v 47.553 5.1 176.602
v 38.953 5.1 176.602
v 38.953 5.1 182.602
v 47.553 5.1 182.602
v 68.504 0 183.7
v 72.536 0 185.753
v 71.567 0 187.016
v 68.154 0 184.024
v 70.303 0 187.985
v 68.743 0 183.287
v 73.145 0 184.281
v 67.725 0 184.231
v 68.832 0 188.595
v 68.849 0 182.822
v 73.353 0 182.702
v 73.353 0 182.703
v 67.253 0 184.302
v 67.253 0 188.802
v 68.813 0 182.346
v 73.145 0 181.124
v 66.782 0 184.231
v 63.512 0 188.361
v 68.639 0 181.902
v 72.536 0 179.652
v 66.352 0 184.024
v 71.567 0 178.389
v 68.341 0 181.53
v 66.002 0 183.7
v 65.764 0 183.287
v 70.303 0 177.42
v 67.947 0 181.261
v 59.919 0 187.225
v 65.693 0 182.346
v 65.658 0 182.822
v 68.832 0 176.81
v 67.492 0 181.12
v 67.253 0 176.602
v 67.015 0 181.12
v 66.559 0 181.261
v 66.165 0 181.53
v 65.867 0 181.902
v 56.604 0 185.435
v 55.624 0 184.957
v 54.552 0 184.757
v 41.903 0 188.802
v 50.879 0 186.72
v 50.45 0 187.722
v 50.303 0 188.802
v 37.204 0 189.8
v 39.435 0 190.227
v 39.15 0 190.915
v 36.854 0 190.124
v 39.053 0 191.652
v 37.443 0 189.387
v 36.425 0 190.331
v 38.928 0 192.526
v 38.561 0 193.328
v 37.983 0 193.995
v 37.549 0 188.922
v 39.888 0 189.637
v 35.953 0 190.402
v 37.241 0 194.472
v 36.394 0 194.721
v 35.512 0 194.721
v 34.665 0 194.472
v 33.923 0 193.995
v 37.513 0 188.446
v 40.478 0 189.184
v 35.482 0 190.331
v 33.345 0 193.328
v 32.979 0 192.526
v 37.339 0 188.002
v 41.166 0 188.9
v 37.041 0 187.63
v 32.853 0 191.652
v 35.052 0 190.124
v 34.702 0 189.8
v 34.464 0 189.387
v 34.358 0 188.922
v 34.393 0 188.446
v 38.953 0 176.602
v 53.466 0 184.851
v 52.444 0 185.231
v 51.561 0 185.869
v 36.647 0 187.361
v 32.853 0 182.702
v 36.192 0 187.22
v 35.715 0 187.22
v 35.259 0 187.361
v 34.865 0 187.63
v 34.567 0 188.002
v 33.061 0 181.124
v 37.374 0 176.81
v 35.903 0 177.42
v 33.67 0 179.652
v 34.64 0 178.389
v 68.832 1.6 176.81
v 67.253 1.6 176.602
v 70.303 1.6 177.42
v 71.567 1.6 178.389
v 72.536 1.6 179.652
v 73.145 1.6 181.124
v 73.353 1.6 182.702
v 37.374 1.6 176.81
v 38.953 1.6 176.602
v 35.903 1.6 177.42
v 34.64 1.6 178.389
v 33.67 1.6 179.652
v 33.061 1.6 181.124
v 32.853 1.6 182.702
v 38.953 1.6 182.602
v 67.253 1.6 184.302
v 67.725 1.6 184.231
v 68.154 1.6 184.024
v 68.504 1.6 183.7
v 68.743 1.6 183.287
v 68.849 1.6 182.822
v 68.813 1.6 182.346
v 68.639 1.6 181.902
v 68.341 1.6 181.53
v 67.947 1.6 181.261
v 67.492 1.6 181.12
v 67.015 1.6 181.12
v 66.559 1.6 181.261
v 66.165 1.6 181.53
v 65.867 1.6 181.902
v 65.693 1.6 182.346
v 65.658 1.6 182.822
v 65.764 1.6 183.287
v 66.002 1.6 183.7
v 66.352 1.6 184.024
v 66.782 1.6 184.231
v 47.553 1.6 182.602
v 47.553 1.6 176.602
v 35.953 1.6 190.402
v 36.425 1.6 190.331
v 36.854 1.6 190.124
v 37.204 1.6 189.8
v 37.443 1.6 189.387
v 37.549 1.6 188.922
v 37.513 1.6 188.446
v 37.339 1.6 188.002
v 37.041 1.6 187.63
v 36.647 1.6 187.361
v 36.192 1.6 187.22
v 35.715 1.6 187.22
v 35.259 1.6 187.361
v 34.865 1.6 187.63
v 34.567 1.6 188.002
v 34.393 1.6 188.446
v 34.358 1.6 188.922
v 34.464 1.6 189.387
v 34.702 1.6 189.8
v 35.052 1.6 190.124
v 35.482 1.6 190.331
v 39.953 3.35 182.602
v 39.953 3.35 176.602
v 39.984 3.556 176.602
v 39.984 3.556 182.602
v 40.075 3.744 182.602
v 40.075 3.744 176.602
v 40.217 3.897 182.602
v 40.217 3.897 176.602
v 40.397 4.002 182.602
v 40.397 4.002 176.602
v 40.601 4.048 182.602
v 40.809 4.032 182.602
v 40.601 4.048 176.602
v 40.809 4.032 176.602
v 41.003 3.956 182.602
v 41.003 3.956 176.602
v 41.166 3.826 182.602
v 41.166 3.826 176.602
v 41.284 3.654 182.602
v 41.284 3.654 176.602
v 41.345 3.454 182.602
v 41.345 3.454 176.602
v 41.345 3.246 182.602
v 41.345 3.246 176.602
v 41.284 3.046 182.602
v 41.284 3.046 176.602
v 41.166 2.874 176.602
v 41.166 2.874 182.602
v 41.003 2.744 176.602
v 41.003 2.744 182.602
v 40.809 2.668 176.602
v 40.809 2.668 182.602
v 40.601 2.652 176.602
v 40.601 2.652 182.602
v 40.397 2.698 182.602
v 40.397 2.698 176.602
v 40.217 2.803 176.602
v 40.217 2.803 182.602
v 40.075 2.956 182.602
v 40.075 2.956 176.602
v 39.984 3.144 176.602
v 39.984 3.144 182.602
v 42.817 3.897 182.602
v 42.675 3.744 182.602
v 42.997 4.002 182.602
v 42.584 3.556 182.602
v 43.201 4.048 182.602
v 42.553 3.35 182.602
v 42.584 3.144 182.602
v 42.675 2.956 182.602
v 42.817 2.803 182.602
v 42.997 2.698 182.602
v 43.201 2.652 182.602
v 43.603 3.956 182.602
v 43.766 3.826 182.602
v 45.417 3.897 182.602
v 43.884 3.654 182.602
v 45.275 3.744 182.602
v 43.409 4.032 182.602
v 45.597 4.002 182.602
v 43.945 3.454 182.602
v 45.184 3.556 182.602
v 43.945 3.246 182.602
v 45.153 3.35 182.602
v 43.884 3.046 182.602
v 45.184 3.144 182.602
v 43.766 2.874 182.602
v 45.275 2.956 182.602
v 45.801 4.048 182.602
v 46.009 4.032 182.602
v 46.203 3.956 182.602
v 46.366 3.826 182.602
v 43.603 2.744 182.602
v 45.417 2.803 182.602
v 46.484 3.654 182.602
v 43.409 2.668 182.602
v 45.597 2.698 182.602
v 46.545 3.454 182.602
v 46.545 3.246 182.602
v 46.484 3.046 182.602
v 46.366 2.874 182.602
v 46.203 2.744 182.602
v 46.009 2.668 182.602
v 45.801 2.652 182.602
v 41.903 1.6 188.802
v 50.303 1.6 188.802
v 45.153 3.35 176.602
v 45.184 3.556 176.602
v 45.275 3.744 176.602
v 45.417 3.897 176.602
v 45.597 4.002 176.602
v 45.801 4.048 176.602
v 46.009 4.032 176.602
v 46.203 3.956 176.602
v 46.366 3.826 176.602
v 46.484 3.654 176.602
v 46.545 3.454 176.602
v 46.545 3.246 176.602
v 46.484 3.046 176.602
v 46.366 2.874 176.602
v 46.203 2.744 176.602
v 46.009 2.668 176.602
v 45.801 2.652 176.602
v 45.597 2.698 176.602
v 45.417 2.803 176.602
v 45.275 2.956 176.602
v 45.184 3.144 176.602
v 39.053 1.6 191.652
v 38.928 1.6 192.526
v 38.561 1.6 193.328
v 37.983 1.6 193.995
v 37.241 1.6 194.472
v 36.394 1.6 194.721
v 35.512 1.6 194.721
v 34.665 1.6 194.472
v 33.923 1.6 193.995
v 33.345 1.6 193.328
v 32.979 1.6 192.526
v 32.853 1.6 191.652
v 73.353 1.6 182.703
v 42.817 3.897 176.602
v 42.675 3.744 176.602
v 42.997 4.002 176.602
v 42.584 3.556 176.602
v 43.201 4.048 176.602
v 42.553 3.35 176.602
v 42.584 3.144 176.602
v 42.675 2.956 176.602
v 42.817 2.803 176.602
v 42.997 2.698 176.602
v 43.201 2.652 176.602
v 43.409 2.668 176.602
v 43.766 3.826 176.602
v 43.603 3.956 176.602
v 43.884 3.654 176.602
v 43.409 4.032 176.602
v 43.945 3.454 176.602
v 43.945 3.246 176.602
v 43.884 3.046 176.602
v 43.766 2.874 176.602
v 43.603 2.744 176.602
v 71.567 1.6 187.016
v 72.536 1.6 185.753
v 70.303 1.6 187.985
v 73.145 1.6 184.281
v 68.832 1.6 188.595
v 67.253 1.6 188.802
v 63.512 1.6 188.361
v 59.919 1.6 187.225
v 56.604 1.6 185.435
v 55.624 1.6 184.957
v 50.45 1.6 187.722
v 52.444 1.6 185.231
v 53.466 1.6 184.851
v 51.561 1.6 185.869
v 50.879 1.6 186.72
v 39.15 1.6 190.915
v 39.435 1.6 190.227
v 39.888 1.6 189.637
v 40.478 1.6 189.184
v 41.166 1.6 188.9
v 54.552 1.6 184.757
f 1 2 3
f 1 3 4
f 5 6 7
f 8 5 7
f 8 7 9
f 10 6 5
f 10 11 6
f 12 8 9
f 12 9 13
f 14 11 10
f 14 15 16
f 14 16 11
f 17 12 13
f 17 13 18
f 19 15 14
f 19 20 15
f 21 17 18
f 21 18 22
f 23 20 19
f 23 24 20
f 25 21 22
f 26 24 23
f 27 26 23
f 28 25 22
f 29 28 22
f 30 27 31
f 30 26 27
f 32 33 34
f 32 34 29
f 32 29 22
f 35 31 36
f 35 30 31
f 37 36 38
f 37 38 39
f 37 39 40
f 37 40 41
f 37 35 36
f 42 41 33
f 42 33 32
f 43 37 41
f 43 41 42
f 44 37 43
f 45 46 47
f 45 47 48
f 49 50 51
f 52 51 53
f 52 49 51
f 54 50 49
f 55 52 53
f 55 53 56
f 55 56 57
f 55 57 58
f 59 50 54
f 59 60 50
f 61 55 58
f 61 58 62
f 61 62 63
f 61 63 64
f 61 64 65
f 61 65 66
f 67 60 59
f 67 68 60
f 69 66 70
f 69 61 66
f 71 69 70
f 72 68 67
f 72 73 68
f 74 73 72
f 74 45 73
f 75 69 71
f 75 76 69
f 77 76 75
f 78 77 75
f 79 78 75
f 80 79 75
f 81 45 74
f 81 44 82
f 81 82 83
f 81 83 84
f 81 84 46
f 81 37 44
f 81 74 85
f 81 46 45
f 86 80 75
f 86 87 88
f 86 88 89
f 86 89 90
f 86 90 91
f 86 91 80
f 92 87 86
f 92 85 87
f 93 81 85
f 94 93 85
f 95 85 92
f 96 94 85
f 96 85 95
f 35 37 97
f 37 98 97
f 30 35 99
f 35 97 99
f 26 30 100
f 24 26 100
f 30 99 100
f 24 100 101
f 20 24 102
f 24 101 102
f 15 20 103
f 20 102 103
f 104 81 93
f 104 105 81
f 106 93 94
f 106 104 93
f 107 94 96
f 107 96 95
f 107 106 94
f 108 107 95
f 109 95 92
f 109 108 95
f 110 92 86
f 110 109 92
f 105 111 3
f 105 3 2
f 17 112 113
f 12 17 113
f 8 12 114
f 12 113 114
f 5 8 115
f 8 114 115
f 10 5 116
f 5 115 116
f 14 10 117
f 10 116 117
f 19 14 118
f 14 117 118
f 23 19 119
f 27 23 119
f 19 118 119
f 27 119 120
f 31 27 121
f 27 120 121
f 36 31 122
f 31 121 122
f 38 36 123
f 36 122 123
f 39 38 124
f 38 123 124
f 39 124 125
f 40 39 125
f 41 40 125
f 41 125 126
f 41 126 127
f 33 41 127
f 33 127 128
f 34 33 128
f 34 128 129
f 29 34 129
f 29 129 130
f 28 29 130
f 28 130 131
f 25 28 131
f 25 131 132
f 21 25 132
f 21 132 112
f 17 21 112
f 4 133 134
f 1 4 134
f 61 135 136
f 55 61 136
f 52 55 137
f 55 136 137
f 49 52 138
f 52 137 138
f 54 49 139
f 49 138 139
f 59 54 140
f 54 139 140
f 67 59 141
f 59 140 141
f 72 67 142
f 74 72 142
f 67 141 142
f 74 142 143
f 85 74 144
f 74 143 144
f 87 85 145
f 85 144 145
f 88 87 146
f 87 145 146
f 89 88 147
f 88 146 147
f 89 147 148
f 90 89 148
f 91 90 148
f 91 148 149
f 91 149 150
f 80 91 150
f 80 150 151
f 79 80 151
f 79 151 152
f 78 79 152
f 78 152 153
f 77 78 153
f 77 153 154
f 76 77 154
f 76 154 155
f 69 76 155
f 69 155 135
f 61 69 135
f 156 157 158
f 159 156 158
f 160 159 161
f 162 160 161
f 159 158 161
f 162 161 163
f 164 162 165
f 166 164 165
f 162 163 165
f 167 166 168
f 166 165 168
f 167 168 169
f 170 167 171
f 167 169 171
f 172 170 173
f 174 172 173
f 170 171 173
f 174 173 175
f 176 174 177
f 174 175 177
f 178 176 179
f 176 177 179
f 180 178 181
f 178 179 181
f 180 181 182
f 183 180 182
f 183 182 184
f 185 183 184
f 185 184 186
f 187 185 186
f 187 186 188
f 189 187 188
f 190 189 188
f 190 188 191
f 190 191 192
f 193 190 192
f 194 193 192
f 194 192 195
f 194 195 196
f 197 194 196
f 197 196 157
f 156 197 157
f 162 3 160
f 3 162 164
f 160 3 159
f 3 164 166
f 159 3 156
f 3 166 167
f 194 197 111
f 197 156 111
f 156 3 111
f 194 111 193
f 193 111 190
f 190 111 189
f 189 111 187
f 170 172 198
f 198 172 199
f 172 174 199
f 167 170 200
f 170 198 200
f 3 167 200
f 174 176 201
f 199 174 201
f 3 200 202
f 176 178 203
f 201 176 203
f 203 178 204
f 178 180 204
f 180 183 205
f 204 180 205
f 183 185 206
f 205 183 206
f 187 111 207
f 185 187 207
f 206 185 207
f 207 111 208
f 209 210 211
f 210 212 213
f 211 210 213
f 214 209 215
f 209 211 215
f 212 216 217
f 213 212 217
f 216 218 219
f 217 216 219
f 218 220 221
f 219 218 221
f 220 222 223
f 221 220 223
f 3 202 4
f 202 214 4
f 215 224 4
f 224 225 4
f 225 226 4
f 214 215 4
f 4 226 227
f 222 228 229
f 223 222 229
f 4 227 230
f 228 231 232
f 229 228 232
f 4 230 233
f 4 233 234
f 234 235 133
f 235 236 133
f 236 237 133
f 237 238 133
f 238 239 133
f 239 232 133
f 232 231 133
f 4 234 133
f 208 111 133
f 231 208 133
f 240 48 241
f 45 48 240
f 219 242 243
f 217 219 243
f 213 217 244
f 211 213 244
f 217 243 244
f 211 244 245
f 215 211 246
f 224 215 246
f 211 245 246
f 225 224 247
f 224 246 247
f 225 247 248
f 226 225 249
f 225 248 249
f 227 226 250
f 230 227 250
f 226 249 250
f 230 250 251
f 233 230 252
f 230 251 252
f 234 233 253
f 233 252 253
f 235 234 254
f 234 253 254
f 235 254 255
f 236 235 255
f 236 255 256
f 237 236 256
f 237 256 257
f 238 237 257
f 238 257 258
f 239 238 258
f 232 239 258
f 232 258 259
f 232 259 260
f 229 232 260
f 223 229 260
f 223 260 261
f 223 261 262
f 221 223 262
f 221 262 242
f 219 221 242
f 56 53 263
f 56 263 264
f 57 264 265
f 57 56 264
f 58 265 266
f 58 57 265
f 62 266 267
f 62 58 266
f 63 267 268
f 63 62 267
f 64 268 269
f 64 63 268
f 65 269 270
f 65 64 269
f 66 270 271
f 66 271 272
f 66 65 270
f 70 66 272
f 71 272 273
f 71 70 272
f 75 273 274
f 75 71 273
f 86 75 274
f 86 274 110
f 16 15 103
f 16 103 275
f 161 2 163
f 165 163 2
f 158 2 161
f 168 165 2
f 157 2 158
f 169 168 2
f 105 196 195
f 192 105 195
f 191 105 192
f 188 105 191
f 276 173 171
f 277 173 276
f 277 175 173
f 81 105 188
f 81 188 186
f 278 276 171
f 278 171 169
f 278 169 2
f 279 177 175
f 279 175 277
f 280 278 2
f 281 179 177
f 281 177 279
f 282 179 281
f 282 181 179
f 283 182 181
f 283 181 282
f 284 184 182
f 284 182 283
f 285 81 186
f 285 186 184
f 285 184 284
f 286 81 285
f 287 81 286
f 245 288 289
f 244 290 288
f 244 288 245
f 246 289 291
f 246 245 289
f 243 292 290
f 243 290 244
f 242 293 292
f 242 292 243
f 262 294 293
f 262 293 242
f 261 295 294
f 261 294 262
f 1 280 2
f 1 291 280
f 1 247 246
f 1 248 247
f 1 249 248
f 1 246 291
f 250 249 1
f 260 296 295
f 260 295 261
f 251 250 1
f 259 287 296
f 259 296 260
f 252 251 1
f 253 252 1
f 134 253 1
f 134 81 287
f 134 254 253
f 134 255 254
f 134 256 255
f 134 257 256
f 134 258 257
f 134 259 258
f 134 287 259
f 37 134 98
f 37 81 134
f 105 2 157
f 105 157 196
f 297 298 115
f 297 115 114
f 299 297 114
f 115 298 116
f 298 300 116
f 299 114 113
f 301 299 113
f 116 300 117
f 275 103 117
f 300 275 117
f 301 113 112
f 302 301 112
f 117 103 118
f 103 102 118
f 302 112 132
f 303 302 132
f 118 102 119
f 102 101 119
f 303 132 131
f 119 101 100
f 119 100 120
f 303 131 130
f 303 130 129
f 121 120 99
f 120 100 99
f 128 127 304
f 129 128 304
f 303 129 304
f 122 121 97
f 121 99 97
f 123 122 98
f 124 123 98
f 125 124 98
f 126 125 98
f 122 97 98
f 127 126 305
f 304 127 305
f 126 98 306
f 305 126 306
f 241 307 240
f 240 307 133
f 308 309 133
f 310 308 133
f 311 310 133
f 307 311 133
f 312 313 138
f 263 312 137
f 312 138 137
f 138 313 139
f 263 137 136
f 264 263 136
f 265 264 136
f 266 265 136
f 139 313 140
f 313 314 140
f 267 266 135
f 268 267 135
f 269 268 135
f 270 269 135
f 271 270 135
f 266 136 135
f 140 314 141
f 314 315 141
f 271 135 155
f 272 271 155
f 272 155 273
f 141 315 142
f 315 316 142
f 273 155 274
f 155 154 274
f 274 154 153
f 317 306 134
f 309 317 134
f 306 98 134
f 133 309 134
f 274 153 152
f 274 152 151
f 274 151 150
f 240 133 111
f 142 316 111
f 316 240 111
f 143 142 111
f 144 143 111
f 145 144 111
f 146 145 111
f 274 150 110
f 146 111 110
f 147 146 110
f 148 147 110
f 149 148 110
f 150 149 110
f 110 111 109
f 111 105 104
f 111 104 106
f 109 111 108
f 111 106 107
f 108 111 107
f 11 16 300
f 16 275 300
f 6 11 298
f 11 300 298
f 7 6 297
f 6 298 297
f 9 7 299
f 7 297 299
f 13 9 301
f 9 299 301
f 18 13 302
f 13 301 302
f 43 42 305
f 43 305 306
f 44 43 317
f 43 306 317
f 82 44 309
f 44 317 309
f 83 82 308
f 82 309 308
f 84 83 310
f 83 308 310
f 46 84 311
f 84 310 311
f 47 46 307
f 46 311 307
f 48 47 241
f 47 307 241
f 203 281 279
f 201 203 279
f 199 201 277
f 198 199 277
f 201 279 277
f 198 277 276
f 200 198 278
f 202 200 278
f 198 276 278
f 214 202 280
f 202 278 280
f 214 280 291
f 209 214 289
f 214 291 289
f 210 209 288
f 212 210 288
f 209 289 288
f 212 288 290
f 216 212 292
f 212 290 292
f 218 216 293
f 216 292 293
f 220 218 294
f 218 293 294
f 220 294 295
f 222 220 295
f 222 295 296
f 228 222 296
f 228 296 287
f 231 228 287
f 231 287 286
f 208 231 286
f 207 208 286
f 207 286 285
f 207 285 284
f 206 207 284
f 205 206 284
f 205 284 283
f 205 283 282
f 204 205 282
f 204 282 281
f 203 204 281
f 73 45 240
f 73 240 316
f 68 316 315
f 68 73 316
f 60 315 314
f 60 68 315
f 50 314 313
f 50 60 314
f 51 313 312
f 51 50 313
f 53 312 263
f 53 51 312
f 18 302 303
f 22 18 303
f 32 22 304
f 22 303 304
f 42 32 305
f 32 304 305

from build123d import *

# Parameters (mm, degrees)
BOSS_EXTRUDE1_DEPTH = 1.6
SKETCH4_R           = 1.6
CUT_EXTRUDE2_DEPTH  = 209.114814948
FILLET2_R           = 6.1
SKETCH2_W           = 8.6
SKETCH2_H           = 6
BOSS_EXTRUDE2_DEPTH = 3.5
CUT_EXTRUDE1_REACH  = 77.737
SKETCH3_R           = 0.7
FILLET1_R           = 20


# Some blends are built 0.0001 mm under size
with BuildPart() as part:
    # Sketch1 → Boss-Extrude1 (new body)
    with BuildSketch(Plane(origin=(0, 0, 0), x_dir=(1, 0, 0), z_dir=(0, 1, 0))):
        with BuildLine():
            Line((32.853134702, -176.602493772), (73.353134702, -176.602493772))
            Line((73.353134702, -176.602493772), (73.353134702, -188.802493772))
            Line((73.353134702, -188.802493772), (41.903134702, -188.802493772))
            ThreePointArc((41.903134702, -188.802493772), (39.887880375, -189.637239445), (39.053134702, -191.652493772))
            ThreePointArc((39.053134702, -191.652493772), (35.953134702, -194.752493772), (32.853134702, -191.652493772))
            Line((32.853134702, -191.652493772), (32.853134702, -176.602493772))
        make_face()
    extrude(amount=BOSS_EXTRUDE1_DEPTH)

    # Sketch4 → Cut-Extrude2 (cut, through all)
    with BuildSketch(Plane(origin=(0, 1.6, 0), x_dir=(1, 0, 0), z_dir=(0, 1, 0))):
        with Locations(Location((67.253134702, -182.702493772, 0), (0, 0, 270))):
            Circle(SKETCH4_R)
        with Locations(Location((35.953134702, -188.802493772, 0), (0, 0, 270))):
            Circle(SKETCH4_R)
        with BuildLine():
            Line((50.303134702, -188.802493772), (58.403134702, -188.802493772))
            ThreePointArc((58.403134702, -188.802493772), (54.353134702, -184.752493772), (50.303134702, -188.802493772))
        make_face()
    extrude(amount=-CUT_EXTRUDE2_DEPTH, mode=Mode.SUBTRACT)

    # Fillet2
    fillet2_edges = [part.edges().sort_by_distance(p)[0] for p in [
        (73.353134702, 0.8, 176.602493772),
        (73.353134702, 0.8, 188.802493772),
        (32.853134702, 0.8, 176.602493772),
    ]]
    fillet(fillet2_edges, radius=FILLET2_R - 0.0001)  # a hair under: the kernel refuses the full size

    # Sketch2 → Boss-Extrude2 (add)
    with BuildSketch(Plane(origin=(0, 1.6, 0), x_dir=(1, 0, 0), z_dir=(0, 1, 0))):
        with Locations((43.253134702, -179.602493772)):
            Rectangle(SKETCH2_W, SKETCH2_H)
    extrude(amount=BOSS_EXTRUDE2_DEPTH)

    # Sketch3 → Cut-Extrude1 (cut, up to next)
    with BuildSketch(Plane(origin=(0, 0, 176.602493772), x_dir=(-1, 0, 0), z_dir=(0, 0, -1)), mode=Mode.PRIVATE) as cut_extrude1_sk1:
        with Locations((-45.853134702, 3.35)):
            Circle(SKETCH3_R)
    cut_extrude1_tool1 = extrude(cut_extrude1_sk1.sketch, amount=-CUT_EXTRUDE1_REACH, mode=Mode.PRIVATE) & part.part
    # Sketch3 → Cut-Extrude1 (cut, up to next)
    with BuildSketch(Plane(origin=(0, 0, 176.602493772), x_dir=(-1, 0, 0), z_dir=(0, 0, -1)), mode=Mode.PRIVATE) as cut_extrude1_sk2:
        with Locations((-40.653134702, 3.35)):
            Circle(SKETCH3_R)
    cut_extrude1_tool2 = extrude(cut_extrude1_sk2.sketch, amount=-CUT_EXTRUDE1_REACH, mode=Mode.PRIVATE) & part.part
    # Sketch3 → Cut-Extrude1 (cut, up to next)
    with BuildSketch(Plane(origin=(0, 0, 176.602493772), x_dir=(-1, 0, 0), z_dir=(0, 0, -1)), mode=Mode.PRIVATE) as cut_extrude1_sk3:
        with Locations((-43.253134702, 3.35)):
            Circle(SKETCH3_R)
    cut_extrude1_tool3 = extrude(cut_extrude1_sk3.sketch, amount=-CUT_EXTRUDE1_REACH, mode=Mode.PRIVATE) & part.part
    add(cut_extrude1_tool1.solids().sort_by_distance((45.853135, 3.35, 176.602494))[0], mode=Mode.SUBTRACT)
    add(cut_extrude1_tool2.solids().sort_by_distance((40.653135, 3.35, 176.602494))[0], mode=Mode.SUBTRACT)
    add(cut_extrude1_tool3.solids().sort_by_distance((43.253135, 3.35, 176.602494))[0], mode=Mode.SUBTRACT)

    # Fillet1
    # the kernel refuses this fillet: 20 mm, written as the material it takes off along each edge
    with BuildSketch(Plane(origin=(58.403134702, 23.72525, 188.802493772), x_dir=(-0.4713226848050216, 0, -0.8819608419811995), z_dir=(0, -1, 0))) as fillet1_piece_1:
        with BuildLine():
            CenterArc((13.244167443, 17.63921684), FILLET1_R, 209.451639401, 32.428171428)
            Line((-4.171252893, 7.805441648), (-4.5195613, 7.608766144))
            ThreePointArc((-4.5195613, 7.608766144), (-2.438410783, 3.71419175), (-0.352784337, -0.188529074))
            Line((-0.352784337, -0.188529074), (0.188529074, -0.352784337))
            ThreePointArc((0.188529074, -0.352784337), (1.908856873, 0.07805859), (3.629184673, -0.352784337))
            Line((3.629184673, -0.352784337), (3.817713747, 0))
        make_face()
    extrude(amount=45.8505, mode=Mode.SUBTRACT)


solid = part.part
